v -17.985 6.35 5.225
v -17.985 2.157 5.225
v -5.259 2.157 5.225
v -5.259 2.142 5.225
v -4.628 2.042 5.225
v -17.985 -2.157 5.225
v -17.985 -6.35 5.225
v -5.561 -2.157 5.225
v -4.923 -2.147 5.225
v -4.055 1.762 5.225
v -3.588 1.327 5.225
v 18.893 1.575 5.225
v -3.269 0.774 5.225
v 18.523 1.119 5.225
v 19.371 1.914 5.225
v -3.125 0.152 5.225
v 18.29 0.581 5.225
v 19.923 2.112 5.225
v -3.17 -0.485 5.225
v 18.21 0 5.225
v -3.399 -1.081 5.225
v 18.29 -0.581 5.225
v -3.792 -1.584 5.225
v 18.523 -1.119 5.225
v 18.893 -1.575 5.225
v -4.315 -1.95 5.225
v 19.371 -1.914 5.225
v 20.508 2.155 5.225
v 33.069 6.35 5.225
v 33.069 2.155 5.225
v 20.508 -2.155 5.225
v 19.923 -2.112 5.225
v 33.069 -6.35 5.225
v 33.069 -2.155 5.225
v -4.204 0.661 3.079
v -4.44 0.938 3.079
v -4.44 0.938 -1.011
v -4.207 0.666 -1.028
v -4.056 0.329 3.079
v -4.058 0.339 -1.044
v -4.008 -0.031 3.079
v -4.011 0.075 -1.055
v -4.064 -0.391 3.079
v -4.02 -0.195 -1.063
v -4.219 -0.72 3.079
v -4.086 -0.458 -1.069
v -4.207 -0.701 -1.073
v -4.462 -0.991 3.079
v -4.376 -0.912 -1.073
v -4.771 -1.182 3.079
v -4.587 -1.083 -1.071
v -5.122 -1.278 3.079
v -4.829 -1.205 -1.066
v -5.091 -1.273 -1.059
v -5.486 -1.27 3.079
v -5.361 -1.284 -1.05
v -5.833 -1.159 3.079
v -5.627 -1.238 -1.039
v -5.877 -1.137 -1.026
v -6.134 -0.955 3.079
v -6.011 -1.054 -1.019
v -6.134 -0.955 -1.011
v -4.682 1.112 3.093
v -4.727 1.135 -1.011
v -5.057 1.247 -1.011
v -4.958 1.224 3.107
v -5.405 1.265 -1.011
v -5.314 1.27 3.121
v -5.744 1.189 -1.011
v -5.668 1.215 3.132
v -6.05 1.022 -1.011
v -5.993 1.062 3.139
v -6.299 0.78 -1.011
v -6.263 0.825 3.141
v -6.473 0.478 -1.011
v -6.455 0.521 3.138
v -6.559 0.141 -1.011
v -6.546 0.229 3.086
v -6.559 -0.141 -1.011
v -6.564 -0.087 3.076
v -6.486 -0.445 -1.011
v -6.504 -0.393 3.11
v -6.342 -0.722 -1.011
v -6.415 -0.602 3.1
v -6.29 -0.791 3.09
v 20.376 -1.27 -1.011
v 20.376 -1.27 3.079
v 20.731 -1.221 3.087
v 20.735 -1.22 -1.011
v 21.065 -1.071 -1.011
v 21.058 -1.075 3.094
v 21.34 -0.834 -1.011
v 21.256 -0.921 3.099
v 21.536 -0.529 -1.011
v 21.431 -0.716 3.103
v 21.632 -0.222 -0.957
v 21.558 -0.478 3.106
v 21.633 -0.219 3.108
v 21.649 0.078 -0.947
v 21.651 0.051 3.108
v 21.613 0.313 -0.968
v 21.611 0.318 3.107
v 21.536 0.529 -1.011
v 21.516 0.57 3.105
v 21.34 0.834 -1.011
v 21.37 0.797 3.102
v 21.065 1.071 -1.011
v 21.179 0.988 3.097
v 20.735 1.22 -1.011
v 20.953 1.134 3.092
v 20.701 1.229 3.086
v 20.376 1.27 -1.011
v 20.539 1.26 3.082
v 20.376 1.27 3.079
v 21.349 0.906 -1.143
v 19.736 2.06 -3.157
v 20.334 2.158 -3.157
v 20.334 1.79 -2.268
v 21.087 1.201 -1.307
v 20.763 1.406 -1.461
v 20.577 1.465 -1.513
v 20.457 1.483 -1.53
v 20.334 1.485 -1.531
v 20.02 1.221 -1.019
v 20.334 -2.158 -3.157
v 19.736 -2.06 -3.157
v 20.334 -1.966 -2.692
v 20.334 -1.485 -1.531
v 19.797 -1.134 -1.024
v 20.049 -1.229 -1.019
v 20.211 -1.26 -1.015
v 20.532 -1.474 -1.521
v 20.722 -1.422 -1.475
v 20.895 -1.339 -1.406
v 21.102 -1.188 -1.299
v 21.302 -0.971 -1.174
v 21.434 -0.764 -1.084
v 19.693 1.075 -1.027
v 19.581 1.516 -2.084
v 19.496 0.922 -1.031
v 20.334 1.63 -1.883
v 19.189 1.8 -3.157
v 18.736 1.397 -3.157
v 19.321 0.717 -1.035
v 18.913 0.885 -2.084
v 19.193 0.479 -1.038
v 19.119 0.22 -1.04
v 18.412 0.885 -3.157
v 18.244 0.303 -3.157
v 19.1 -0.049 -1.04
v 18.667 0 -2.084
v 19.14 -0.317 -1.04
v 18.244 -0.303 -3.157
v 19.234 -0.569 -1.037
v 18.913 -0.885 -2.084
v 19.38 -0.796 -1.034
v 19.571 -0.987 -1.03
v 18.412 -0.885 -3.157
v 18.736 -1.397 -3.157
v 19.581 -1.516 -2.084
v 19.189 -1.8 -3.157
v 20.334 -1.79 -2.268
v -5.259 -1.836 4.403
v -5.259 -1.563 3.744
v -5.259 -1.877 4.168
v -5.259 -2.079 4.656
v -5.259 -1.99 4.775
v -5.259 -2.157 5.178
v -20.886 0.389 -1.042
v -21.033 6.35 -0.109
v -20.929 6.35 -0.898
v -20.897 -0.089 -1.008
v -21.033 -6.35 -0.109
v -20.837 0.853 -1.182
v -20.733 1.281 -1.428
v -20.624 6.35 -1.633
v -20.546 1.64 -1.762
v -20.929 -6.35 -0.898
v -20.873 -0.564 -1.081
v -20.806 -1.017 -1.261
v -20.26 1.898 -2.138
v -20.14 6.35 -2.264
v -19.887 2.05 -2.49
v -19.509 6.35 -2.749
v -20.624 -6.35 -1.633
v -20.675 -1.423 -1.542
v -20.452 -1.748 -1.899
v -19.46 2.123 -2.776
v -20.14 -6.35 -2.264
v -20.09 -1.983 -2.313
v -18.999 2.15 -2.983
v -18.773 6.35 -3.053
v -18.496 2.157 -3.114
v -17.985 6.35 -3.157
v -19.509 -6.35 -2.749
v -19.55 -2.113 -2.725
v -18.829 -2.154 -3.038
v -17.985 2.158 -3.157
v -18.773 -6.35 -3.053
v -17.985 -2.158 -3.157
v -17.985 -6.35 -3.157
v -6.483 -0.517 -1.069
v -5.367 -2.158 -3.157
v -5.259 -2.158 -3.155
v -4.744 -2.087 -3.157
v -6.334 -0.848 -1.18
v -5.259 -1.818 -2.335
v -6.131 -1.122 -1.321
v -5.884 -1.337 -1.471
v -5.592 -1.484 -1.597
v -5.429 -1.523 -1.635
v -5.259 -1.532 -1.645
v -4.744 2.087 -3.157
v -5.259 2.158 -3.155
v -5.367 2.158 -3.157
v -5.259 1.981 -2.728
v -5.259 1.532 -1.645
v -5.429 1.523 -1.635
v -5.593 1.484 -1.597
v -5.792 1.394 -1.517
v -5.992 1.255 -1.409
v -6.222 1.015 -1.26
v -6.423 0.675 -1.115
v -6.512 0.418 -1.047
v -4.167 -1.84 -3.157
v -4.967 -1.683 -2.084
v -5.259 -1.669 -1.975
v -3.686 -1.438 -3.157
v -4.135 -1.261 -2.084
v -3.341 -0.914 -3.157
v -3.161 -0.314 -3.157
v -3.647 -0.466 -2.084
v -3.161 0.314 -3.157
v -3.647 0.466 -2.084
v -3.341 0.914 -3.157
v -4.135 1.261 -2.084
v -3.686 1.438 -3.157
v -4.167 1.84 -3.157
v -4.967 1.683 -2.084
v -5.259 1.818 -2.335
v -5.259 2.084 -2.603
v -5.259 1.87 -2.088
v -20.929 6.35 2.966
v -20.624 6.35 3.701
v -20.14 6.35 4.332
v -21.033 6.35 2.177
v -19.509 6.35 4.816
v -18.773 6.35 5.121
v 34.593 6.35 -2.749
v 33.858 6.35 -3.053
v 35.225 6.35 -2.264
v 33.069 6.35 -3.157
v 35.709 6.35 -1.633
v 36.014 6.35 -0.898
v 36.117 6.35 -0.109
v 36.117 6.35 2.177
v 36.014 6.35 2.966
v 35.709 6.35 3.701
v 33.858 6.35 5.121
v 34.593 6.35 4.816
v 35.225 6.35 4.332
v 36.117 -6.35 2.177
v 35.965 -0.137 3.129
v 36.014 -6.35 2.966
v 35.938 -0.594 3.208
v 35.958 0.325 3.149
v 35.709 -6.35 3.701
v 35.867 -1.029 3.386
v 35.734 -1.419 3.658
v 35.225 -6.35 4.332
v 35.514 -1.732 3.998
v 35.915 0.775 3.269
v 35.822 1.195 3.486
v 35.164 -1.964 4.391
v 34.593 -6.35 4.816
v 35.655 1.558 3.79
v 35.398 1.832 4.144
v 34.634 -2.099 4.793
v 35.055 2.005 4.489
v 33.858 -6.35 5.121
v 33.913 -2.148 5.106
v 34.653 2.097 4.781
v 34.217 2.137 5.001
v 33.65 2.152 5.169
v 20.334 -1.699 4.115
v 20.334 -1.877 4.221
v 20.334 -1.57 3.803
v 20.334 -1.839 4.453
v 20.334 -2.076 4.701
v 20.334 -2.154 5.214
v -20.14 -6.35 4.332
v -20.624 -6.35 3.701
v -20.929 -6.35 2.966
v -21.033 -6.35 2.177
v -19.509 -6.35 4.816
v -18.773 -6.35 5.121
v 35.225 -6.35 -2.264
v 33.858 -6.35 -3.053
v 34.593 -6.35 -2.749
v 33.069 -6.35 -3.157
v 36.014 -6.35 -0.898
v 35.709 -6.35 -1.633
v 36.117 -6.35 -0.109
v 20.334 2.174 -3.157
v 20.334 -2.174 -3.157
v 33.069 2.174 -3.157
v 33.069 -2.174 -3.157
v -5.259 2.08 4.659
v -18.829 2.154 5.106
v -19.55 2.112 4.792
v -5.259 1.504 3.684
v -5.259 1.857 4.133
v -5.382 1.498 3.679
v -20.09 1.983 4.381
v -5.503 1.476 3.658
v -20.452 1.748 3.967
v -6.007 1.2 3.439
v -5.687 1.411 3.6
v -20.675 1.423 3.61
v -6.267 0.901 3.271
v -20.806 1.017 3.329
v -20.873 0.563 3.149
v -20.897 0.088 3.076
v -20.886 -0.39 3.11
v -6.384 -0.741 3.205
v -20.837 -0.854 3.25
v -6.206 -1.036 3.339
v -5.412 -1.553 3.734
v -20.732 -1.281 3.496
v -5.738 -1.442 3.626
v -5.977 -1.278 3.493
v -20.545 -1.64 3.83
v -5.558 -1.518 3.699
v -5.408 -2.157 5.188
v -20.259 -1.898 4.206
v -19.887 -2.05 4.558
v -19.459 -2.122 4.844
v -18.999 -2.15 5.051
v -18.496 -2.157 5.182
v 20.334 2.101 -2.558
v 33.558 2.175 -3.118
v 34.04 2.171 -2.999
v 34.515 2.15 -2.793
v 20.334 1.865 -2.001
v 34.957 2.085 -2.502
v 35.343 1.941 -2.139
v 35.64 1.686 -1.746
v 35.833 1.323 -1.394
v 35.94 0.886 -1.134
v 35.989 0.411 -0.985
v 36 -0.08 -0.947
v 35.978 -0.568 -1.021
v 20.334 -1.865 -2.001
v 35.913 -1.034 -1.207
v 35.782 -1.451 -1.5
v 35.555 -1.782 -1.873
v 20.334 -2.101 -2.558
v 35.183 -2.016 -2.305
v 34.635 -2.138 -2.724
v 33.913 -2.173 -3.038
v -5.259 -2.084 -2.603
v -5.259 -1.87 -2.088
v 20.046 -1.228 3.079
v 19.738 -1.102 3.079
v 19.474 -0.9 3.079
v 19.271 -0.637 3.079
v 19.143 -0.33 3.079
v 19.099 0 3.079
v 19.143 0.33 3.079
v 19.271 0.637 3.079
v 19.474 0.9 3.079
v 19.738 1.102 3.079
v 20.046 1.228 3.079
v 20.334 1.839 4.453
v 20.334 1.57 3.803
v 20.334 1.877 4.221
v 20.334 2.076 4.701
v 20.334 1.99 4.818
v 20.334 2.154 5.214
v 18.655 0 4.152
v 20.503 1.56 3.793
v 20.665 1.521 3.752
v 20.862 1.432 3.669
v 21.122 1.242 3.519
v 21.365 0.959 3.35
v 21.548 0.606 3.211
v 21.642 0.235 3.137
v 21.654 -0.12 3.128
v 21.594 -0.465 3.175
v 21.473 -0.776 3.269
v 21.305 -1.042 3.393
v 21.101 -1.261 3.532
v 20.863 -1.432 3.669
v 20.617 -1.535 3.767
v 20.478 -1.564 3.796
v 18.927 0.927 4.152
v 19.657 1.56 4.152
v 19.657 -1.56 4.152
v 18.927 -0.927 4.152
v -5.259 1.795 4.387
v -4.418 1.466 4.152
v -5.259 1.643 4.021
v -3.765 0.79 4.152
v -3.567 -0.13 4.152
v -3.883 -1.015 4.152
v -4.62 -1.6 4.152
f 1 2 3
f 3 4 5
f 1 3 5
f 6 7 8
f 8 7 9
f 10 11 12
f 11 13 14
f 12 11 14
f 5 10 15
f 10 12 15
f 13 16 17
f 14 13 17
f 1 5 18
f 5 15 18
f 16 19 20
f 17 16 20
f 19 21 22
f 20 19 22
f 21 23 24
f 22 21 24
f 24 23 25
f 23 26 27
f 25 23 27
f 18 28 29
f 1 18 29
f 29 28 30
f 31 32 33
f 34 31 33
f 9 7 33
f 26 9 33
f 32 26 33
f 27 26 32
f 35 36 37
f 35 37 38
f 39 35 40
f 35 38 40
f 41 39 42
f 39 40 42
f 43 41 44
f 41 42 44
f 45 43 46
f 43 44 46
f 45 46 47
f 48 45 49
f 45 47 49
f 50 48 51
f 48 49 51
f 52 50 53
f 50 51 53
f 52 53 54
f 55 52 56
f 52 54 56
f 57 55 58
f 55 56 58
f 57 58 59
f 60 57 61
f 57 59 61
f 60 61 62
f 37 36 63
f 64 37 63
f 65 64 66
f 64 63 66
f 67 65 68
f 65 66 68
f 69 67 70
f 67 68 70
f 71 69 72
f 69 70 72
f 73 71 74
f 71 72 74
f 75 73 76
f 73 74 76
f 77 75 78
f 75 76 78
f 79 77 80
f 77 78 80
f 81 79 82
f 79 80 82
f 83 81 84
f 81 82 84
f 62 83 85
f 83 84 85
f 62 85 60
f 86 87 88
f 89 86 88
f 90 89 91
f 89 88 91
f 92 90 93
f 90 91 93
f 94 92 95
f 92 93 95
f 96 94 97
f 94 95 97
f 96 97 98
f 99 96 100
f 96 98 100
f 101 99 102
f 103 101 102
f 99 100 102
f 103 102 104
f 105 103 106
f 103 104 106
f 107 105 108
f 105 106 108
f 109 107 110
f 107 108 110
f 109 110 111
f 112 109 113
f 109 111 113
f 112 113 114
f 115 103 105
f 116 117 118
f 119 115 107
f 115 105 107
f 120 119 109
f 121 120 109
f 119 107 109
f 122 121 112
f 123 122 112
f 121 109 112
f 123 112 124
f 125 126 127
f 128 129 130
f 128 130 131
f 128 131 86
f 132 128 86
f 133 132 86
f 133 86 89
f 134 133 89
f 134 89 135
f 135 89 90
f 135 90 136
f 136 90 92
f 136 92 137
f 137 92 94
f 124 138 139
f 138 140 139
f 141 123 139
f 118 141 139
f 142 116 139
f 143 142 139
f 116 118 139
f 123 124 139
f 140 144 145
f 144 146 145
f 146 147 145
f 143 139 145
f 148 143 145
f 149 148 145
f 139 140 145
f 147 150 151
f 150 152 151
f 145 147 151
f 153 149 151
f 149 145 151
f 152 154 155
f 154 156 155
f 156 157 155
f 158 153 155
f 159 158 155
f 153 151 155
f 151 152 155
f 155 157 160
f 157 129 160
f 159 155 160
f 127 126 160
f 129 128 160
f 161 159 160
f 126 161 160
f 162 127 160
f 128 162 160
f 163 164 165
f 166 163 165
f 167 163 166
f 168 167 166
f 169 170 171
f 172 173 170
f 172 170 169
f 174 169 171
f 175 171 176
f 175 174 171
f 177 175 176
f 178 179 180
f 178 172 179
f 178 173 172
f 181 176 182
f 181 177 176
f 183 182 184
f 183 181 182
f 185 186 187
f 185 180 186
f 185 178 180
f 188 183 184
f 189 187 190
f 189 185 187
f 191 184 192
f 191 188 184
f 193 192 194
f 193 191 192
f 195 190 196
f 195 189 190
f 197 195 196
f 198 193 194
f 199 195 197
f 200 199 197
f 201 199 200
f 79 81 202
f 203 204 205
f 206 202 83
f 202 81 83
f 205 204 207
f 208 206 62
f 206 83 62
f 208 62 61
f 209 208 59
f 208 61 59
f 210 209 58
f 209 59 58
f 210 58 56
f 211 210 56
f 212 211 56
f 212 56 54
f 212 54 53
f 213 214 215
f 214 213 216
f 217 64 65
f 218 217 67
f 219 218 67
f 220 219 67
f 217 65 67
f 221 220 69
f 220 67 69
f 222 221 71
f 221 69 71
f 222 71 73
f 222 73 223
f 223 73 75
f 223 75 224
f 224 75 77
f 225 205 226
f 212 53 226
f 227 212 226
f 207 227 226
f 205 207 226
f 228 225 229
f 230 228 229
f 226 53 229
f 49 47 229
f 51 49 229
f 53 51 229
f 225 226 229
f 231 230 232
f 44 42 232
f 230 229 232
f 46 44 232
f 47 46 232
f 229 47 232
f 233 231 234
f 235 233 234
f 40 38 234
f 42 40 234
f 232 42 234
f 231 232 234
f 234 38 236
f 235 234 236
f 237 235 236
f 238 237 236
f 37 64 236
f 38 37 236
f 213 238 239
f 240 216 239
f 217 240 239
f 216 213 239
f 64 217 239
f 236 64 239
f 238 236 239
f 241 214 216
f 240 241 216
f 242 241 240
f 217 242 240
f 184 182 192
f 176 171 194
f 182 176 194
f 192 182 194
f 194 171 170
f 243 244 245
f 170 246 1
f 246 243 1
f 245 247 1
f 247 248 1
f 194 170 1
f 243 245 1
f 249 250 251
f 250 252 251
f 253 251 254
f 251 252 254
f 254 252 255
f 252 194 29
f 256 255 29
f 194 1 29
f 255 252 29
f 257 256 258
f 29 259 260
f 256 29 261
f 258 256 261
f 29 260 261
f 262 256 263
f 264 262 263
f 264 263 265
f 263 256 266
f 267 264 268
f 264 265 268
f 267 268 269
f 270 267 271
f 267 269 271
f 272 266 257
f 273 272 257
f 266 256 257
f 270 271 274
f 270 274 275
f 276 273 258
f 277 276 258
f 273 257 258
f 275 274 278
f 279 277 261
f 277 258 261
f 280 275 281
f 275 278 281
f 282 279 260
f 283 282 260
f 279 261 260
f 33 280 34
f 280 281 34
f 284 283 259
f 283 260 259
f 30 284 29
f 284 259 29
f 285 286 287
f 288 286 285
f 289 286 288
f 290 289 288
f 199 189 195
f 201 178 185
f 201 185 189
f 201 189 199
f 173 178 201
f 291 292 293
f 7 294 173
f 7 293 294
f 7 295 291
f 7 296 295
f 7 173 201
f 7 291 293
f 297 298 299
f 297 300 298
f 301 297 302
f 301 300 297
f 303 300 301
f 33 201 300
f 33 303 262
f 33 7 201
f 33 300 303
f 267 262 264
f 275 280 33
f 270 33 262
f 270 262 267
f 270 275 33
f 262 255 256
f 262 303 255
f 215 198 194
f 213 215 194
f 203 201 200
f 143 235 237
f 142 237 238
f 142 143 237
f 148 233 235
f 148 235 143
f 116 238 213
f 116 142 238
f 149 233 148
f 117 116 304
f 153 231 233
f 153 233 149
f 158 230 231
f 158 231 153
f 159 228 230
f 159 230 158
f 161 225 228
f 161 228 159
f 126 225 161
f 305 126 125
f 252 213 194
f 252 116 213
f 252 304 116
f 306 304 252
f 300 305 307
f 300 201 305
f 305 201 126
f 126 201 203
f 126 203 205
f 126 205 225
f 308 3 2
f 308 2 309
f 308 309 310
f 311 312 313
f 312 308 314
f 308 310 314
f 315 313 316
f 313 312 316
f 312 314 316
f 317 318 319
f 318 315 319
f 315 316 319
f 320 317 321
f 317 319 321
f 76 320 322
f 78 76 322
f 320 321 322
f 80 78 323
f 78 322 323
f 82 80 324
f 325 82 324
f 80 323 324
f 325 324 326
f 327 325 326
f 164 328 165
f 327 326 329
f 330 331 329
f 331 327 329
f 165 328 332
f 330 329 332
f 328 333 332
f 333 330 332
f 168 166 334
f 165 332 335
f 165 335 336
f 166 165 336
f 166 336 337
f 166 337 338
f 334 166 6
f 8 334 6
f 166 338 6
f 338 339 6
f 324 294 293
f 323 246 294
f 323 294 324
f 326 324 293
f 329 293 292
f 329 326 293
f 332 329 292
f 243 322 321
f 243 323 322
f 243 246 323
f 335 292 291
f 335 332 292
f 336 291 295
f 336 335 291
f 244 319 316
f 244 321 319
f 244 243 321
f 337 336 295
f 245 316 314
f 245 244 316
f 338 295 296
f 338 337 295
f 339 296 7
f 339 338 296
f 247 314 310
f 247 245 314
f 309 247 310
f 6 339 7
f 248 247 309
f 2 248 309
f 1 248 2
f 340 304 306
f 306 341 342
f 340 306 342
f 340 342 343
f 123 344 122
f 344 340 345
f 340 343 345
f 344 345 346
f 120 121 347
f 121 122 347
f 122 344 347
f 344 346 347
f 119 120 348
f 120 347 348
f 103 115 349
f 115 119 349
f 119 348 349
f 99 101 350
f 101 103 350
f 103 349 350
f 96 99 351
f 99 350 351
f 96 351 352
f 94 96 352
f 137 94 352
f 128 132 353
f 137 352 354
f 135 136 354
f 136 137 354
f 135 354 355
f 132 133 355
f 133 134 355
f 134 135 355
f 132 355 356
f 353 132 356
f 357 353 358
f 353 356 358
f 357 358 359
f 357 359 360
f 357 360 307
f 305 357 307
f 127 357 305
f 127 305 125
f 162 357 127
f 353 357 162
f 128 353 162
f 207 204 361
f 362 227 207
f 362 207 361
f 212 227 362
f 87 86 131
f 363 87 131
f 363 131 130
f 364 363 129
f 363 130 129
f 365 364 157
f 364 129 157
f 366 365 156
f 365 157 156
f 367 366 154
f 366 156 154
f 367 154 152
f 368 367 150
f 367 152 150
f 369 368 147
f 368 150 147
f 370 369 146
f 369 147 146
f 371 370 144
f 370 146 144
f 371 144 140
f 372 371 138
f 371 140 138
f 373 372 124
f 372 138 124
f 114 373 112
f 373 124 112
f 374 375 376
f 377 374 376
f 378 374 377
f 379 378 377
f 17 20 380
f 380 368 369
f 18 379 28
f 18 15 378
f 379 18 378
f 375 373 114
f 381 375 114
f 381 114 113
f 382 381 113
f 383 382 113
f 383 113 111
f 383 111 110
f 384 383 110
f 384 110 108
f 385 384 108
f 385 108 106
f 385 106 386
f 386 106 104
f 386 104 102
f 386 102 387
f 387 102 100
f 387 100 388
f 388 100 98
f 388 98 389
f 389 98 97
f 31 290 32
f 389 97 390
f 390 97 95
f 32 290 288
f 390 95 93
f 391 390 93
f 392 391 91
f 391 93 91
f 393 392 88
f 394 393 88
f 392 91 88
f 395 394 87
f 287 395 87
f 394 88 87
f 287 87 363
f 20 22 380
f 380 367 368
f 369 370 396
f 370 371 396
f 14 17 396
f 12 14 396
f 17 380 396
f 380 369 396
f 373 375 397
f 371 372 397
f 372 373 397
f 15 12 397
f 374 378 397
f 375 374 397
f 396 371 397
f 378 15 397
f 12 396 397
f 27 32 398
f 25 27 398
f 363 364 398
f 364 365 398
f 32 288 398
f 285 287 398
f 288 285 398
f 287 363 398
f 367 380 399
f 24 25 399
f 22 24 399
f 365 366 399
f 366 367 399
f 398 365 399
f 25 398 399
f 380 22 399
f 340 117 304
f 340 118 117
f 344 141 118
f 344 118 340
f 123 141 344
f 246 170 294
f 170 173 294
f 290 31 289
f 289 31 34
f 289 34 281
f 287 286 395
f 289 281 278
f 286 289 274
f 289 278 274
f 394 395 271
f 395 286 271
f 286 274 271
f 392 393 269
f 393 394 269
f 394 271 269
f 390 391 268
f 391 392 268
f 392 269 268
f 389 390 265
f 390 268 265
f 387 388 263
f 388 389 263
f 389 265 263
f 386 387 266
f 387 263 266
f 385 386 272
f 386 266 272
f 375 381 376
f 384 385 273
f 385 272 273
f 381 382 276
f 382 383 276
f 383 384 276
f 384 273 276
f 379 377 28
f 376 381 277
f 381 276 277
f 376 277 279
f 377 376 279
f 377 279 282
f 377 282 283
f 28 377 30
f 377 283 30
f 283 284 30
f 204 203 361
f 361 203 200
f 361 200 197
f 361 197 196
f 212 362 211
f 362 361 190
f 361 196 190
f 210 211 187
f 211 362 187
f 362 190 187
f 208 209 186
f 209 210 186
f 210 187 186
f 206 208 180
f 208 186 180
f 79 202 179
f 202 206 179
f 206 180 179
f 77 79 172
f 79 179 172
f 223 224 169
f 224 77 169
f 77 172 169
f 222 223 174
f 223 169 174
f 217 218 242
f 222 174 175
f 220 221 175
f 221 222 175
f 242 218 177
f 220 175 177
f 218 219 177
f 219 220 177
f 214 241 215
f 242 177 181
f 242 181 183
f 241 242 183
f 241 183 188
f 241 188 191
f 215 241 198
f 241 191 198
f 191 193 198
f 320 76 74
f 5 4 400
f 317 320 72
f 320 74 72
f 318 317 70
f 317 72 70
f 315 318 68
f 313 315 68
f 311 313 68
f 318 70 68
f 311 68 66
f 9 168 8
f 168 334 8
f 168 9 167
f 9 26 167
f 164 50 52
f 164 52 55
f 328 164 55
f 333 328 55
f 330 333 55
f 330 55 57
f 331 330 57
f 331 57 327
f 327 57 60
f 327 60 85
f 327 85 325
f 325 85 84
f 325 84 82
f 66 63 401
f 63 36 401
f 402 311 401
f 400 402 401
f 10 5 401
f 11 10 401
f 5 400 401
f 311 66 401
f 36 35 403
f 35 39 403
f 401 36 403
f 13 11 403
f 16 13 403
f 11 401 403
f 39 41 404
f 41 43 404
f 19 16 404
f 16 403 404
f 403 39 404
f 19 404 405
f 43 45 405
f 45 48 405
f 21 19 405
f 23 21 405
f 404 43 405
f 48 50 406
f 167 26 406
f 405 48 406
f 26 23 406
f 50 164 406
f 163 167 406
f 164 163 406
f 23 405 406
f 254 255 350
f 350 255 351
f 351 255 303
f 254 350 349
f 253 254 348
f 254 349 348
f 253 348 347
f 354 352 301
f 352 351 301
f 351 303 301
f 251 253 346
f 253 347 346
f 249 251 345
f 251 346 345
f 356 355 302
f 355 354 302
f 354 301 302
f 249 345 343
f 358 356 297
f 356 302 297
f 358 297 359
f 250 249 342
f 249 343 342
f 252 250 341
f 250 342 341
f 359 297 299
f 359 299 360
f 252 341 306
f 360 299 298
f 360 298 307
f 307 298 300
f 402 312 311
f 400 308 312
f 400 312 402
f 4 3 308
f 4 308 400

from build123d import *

# Parameters (mm, degrees)
F0_W                 = 57.15
F0_H                 = 8.382
F1_DEPTH             = 6.35
F1_DEPTH_BACK        = 6.35
F2_R                 = 3.048
F5_D                 = 2.54
F5_CSINK_D           = 4.318
F5_CSINK_ANGLE       = 45
F5_ON_F4_D           = 2.54
F5_ON_F4_CSINK_D     = 4.318
F5_ON_F4_CSINK_ANGLE = 45
F7_R                 = 2.1552375293
F7_R_2               = 2.1745763706
F8_DEPTH             = 15.78356
F6_R                 = 2.1575082274
F6_R_2               = 2.1578758636
F9_DEPTH             = 15.7734


with BuildPart() as f1:
    # F0 (on Front) → F1 (new body, two sides)
    with BuildSketch(Plane.XZ) as f1_sk:
        with Locations((7.5424778849, 1.0338034335)):
            Rectangle(F0_W, F0_H)
    extrude(amount=F1_DEPTH)
    extrude(f1_sk.sketch, amount=-F1_DEPTH_BACK)

    # F2
    f2_edges = [f1.edges().sort_by_distance(p)[0] for p in [
        (-21.032522, 0, 5.224803),
        (36.117478, 0, 5.224803),
        (-21.032522, 0, -3.157197),
        (36.117478, 0, -3.157197),
    ]]
    fillet(f2_edges, radius=F2_R)

    # F5 (through all)
    with Locations(Plane.XY.offset(5.2248034335)):
        with Locations((-5.2774393328, -0.0172255386), (20.3694778849, 0)):
            CounterSinkHole(F5_D / 2, F5_CSINK_D / 2, counter_sink_angle=F5_CSINK_ANGLE)

    # F5 on F4 (through all)
    with Locations(Plane(origin=(0, 0, -3.1571965665), x_dir=(1, 0, 0), z_dir=(0, 0, -1))):
        with Locations((20.3817205831, 0), (-5.2966976866, 0)):
            CounterSinkHole(F5_ON_F4_D / 2, F5_ON_F4_CSINK_D / 2, counter_sink_angle=F5_ON_F4_CSINK_ANGLE)

    # F7 (on face) → F8 (cut)
    with BuildSketch(Plane.YZ.offset(36.1174778849)):
        with Locations((0, 5.2797254175)):
            Circle(F7_R)
        with Locations((0, -3.1201594975)):
            Circle(F7_R_2)
    extrude(amount=-F8_DEPTH, mode=Mode.SUBTRACT)

    # F6 (on face) → F9 (cut)
    with BuildSketch(Plane(origin=(-21.0325221151, 0, 0), x_dir=(0, -1, 0), z_dir=(-1, 0, 0))):
        with Locations((0, 5.2316803485)):
            Circle(F6_R)
        with Locations((0, -3.1642527319)):
            Circle(F6_R_2)
    extrude(amount=-F9_DEPTH, mode=Mode.SUBTRACT)


solid = f1.part
